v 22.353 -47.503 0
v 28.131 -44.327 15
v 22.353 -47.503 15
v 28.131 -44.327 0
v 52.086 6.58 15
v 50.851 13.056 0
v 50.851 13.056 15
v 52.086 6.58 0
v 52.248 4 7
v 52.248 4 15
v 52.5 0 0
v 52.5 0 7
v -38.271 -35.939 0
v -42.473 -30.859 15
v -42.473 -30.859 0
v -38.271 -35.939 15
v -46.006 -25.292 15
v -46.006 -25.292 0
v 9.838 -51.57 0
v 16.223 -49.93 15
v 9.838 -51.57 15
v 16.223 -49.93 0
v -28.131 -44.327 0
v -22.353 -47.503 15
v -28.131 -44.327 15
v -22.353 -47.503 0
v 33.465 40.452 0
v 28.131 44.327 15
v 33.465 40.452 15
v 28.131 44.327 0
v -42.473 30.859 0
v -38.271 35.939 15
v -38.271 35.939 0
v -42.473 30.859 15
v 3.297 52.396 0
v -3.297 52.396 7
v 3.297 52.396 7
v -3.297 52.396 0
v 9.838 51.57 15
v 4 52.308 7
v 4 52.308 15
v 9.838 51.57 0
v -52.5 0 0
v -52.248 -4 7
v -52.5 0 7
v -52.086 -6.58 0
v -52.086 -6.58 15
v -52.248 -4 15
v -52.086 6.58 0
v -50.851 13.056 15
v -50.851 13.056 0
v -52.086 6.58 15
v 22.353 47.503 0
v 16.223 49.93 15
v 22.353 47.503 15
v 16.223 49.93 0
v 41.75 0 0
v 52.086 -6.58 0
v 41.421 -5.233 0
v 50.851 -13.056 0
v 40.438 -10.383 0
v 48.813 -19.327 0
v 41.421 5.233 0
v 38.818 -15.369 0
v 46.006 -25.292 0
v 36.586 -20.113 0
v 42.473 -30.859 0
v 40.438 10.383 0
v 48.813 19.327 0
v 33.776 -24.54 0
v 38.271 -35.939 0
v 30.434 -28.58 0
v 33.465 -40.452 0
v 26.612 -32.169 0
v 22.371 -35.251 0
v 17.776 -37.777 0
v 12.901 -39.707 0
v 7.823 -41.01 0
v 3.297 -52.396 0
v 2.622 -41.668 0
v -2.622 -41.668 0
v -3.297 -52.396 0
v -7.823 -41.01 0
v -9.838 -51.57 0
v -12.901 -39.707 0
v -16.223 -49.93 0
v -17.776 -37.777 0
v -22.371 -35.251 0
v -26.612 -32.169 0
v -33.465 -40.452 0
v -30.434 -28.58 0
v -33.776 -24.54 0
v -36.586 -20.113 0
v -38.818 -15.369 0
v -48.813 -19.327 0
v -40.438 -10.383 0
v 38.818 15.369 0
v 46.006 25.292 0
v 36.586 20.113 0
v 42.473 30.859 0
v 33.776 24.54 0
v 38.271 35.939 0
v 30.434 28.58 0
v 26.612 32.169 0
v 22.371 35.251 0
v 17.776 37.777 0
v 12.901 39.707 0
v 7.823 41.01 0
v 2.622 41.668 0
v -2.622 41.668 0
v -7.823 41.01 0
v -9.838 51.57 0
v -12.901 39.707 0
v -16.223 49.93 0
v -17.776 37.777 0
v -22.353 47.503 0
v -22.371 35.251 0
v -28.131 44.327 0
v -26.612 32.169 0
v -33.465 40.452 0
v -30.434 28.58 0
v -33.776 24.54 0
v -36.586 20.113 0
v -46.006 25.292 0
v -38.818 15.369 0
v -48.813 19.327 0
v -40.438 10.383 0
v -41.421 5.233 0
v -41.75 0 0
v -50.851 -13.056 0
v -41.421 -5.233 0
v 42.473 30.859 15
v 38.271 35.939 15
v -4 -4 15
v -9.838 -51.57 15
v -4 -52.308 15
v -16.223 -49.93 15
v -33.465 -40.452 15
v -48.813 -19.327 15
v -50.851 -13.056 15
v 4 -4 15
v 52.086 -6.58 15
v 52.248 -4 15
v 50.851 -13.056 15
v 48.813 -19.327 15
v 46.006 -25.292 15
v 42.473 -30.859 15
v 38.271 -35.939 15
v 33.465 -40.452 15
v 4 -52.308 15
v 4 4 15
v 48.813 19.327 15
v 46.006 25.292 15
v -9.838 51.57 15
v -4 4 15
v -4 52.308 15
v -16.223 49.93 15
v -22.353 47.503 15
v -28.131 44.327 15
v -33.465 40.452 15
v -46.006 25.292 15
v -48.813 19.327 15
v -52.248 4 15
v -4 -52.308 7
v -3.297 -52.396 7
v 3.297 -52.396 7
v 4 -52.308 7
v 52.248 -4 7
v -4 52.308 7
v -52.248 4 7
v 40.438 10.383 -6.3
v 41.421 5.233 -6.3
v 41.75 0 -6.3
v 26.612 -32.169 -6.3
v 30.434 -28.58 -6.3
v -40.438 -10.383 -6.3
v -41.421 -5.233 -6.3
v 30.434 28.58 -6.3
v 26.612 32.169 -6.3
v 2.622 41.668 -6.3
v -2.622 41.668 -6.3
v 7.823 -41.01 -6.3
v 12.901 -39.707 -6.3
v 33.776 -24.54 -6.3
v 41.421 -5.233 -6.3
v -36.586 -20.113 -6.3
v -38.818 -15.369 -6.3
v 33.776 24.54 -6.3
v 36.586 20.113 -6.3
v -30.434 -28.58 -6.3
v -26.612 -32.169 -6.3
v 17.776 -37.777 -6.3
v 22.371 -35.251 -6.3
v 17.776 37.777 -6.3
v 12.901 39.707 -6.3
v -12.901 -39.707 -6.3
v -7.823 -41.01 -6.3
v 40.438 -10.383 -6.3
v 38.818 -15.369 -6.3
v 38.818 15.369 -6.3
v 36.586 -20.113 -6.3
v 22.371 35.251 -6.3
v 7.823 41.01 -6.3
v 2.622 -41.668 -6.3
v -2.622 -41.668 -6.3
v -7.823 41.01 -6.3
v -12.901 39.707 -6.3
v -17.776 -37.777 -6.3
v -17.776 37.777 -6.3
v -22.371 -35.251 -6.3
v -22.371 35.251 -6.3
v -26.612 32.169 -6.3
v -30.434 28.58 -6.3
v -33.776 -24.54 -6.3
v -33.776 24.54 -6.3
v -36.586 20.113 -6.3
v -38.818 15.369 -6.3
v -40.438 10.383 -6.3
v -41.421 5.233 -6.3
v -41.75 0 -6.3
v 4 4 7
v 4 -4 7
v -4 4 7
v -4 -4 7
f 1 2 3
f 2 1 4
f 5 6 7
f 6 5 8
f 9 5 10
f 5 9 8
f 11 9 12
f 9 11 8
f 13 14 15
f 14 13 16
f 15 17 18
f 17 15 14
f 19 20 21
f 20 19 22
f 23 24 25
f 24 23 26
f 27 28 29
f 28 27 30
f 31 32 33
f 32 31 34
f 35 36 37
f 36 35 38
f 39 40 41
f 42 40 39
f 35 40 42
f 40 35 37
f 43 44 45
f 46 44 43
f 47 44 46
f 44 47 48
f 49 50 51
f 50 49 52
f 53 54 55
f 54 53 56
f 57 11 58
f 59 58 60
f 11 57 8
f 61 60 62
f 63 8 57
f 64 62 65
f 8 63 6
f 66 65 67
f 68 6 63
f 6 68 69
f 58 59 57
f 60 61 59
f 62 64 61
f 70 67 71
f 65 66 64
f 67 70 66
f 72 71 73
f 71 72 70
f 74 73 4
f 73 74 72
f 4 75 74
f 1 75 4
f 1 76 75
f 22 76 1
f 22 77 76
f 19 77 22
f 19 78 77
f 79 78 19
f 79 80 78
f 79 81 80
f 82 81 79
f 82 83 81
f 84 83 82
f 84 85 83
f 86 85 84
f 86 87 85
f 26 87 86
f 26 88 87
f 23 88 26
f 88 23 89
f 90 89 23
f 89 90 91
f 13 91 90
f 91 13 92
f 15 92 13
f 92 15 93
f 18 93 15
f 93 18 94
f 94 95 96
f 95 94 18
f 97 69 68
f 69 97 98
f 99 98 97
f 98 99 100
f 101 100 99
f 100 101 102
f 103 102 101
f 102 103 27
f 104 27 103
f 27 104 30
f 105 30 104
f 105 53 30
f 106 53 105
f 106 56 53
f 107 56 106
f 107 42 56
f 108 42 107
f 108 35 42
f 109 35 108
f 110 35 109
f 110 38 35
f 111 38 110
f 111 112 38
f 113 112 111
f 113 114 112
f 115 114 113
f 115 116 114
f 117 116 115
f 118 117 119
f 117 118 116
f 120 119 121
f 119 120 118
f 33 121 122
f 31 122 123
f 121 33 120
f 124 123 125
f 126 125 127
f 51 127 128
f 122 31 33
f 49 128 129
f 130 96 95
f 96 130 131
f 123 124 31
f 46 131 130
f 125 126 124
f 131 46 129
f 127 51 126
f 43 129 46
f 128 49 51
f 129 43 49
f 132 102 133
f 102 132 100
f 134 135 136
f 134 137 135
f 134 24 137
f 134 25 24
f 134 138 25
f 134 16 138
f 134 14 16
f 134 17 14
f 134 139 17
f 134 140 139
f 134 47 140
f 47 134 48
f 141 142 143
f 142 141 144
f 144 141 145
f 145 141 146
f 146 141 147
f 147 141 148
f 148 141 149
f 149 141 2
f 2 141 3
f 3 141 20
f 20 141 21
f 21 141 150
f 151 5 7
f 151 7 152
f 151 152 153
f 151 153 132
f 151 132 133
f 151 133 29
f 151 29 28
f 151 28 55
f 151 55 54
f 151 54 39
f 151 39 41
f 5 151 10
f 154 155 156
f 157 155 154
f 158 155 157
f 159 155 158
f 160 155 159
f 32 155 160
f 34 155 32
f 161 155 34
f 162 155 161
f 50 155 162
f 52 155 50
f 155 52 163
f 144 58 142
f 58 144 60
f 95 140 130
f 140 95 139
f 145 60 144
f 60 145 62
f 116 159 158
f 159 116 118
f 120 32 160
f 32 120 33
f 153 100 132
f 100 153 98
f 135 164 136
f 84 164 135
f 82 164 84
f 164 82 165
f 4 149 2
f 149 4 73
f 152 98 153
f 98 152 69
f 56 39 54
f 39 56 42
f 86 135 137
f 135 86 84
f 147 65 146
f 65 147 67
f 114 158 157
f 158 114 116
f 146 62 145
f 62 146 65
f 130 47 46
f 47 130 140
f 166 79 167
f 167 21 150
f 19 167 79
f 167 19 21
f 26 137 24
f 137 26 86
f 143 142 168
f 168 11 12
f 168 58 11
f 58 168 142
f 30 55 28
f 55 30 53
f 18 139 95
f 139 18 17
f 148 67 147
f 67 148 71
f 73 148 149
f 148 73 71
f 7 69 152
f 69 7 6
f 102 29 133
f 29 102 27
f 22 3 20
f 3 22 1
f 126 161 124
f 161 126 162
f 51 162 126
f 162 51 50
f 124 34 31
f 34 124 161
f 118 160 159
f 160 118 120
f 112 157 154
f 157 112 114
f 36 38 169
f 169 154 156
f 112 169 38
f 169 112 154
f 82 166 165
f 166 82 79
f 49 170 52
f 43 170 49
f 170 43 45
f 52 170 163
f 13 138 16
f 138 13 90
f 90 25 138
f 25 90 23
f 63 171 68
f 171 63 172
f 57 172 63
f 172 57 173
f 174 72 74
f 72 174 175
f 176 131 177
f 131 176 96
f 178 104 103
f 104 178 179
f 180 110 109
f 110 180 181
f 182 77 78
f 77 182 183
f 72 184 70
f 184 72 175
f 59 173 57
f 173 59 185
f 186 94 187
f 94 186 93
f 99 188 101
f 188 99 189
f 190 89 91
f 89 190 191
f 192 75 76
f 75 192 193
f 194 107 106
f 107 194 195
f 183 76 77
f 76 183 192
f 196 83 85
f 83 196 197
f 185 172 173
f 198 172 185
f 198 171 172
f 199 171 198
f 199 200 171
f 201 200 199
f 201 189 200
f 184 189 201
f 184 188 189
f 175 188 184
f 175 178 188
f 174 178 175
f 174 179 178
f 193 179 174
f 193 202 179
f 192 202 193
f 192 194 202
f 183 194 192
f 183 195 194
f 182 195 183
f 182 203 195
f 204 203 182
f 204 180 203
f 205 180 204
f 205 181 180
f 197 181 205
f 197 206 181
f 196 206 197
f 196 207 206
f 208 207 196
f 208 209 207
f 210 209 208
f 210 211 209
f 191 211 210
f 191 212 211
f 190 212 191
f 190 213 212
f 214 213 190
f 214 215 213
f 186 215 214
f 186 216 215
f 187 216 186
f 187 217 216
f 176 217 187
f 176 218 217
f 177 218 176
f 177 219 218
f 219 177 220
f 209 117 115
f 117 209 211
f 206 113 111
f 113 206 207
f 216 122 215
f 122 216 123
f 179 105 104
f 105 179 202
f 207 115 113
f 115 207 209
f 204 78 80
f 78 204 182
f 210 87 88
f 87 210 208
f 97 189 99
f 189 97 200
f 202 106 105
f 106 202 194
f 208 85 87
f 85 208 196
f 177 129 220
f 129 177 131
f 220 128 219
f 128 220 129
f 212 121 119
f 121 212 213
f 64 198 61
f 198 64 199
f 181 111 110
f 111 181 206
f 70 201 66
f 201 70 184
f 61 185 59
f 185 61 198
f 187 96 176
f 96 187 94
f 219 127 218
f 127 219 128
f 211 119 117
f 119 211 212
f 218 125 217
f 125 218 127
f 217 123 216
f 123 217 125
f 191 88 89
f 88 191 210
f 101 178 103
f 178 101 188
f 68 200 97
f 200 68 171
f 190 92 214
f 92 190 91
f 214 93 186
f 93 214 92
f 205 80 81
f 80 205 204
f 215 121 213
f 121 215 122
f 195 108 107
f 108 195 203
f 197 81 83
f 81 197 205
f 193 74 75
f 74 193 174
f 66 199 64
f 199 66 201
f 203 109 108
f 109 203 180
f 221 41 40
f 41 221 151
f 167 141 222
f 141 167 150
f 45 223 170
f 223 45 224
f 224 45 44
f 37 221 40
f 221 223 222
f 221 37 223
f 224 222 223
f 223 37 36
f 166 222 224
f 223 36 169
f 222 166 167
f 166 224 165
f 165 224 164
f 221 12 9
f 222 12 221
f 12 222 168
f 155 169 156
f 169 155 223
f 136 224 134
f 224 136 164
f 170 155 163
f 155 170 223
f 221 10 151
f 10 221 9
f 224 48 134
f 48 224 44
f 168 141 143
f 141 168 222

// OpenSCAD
//Begin of user adjustable parameters...

//These parameters are defaulted for the... 
//Harbor Freight 1.5 ton jack.
//Adjust for your jack accordingly.
jackpad_bot_dia=83.5;
jackpad_top_dia=105;
jackpad_bot_height=6.3;

//This is the thickness of the top cylinder.
//If you are adding slots make sure this is "thicker"
//than the slot(s) height(s)
//For no slots I set this to 9
jackpad_top_height=15;

//set these to zero if you want just a flat top
//set channel_1 width/height for a single slot
//set channel_2 width/height for a cross slot
channel_1_width=8;
channel_1_height=8;
channel_2_width=8;
channel_2_height=8;

//End of user adjusted parameters...


jackpad_bot_rad=jackpad_bot_dia / 2.0;
jackpad_top_rad=jackpad_top_dia / 2.0;
    
difference(){    
union(){
	translate([0,0,(jackpad_top_height/2.0)]) {
        cylinder (h = jackpad_top_height, r=jackpad_top_rad, center = true, $fn=50);
        }
	translate([0,0,-(jackpad_bot_height/2.0)]) {
        cylinder (h = jackpad_bot_height, r=jackpad_bot_rad, center = true, $fn=50);
        }
     }  

union(){        
    translate([0,0,(((jackpad_top_height/2.0)-(channel_1_height/2.0))+(jackpad_top_height/2.0))]) {
        cube ([channel_1_height,(jackpad_top_dia+10),channel_1_height], center = true);
        }   
    translate([0,0,(((jackpad_top_height/2.0)-(channel_1_height/2.0))+(jackpad_top_height/2.0))]) {
        cube ([(jackpad_top_dia+10),channel_2_width,channel_2_height], center = true);
        }  
     }  
}
